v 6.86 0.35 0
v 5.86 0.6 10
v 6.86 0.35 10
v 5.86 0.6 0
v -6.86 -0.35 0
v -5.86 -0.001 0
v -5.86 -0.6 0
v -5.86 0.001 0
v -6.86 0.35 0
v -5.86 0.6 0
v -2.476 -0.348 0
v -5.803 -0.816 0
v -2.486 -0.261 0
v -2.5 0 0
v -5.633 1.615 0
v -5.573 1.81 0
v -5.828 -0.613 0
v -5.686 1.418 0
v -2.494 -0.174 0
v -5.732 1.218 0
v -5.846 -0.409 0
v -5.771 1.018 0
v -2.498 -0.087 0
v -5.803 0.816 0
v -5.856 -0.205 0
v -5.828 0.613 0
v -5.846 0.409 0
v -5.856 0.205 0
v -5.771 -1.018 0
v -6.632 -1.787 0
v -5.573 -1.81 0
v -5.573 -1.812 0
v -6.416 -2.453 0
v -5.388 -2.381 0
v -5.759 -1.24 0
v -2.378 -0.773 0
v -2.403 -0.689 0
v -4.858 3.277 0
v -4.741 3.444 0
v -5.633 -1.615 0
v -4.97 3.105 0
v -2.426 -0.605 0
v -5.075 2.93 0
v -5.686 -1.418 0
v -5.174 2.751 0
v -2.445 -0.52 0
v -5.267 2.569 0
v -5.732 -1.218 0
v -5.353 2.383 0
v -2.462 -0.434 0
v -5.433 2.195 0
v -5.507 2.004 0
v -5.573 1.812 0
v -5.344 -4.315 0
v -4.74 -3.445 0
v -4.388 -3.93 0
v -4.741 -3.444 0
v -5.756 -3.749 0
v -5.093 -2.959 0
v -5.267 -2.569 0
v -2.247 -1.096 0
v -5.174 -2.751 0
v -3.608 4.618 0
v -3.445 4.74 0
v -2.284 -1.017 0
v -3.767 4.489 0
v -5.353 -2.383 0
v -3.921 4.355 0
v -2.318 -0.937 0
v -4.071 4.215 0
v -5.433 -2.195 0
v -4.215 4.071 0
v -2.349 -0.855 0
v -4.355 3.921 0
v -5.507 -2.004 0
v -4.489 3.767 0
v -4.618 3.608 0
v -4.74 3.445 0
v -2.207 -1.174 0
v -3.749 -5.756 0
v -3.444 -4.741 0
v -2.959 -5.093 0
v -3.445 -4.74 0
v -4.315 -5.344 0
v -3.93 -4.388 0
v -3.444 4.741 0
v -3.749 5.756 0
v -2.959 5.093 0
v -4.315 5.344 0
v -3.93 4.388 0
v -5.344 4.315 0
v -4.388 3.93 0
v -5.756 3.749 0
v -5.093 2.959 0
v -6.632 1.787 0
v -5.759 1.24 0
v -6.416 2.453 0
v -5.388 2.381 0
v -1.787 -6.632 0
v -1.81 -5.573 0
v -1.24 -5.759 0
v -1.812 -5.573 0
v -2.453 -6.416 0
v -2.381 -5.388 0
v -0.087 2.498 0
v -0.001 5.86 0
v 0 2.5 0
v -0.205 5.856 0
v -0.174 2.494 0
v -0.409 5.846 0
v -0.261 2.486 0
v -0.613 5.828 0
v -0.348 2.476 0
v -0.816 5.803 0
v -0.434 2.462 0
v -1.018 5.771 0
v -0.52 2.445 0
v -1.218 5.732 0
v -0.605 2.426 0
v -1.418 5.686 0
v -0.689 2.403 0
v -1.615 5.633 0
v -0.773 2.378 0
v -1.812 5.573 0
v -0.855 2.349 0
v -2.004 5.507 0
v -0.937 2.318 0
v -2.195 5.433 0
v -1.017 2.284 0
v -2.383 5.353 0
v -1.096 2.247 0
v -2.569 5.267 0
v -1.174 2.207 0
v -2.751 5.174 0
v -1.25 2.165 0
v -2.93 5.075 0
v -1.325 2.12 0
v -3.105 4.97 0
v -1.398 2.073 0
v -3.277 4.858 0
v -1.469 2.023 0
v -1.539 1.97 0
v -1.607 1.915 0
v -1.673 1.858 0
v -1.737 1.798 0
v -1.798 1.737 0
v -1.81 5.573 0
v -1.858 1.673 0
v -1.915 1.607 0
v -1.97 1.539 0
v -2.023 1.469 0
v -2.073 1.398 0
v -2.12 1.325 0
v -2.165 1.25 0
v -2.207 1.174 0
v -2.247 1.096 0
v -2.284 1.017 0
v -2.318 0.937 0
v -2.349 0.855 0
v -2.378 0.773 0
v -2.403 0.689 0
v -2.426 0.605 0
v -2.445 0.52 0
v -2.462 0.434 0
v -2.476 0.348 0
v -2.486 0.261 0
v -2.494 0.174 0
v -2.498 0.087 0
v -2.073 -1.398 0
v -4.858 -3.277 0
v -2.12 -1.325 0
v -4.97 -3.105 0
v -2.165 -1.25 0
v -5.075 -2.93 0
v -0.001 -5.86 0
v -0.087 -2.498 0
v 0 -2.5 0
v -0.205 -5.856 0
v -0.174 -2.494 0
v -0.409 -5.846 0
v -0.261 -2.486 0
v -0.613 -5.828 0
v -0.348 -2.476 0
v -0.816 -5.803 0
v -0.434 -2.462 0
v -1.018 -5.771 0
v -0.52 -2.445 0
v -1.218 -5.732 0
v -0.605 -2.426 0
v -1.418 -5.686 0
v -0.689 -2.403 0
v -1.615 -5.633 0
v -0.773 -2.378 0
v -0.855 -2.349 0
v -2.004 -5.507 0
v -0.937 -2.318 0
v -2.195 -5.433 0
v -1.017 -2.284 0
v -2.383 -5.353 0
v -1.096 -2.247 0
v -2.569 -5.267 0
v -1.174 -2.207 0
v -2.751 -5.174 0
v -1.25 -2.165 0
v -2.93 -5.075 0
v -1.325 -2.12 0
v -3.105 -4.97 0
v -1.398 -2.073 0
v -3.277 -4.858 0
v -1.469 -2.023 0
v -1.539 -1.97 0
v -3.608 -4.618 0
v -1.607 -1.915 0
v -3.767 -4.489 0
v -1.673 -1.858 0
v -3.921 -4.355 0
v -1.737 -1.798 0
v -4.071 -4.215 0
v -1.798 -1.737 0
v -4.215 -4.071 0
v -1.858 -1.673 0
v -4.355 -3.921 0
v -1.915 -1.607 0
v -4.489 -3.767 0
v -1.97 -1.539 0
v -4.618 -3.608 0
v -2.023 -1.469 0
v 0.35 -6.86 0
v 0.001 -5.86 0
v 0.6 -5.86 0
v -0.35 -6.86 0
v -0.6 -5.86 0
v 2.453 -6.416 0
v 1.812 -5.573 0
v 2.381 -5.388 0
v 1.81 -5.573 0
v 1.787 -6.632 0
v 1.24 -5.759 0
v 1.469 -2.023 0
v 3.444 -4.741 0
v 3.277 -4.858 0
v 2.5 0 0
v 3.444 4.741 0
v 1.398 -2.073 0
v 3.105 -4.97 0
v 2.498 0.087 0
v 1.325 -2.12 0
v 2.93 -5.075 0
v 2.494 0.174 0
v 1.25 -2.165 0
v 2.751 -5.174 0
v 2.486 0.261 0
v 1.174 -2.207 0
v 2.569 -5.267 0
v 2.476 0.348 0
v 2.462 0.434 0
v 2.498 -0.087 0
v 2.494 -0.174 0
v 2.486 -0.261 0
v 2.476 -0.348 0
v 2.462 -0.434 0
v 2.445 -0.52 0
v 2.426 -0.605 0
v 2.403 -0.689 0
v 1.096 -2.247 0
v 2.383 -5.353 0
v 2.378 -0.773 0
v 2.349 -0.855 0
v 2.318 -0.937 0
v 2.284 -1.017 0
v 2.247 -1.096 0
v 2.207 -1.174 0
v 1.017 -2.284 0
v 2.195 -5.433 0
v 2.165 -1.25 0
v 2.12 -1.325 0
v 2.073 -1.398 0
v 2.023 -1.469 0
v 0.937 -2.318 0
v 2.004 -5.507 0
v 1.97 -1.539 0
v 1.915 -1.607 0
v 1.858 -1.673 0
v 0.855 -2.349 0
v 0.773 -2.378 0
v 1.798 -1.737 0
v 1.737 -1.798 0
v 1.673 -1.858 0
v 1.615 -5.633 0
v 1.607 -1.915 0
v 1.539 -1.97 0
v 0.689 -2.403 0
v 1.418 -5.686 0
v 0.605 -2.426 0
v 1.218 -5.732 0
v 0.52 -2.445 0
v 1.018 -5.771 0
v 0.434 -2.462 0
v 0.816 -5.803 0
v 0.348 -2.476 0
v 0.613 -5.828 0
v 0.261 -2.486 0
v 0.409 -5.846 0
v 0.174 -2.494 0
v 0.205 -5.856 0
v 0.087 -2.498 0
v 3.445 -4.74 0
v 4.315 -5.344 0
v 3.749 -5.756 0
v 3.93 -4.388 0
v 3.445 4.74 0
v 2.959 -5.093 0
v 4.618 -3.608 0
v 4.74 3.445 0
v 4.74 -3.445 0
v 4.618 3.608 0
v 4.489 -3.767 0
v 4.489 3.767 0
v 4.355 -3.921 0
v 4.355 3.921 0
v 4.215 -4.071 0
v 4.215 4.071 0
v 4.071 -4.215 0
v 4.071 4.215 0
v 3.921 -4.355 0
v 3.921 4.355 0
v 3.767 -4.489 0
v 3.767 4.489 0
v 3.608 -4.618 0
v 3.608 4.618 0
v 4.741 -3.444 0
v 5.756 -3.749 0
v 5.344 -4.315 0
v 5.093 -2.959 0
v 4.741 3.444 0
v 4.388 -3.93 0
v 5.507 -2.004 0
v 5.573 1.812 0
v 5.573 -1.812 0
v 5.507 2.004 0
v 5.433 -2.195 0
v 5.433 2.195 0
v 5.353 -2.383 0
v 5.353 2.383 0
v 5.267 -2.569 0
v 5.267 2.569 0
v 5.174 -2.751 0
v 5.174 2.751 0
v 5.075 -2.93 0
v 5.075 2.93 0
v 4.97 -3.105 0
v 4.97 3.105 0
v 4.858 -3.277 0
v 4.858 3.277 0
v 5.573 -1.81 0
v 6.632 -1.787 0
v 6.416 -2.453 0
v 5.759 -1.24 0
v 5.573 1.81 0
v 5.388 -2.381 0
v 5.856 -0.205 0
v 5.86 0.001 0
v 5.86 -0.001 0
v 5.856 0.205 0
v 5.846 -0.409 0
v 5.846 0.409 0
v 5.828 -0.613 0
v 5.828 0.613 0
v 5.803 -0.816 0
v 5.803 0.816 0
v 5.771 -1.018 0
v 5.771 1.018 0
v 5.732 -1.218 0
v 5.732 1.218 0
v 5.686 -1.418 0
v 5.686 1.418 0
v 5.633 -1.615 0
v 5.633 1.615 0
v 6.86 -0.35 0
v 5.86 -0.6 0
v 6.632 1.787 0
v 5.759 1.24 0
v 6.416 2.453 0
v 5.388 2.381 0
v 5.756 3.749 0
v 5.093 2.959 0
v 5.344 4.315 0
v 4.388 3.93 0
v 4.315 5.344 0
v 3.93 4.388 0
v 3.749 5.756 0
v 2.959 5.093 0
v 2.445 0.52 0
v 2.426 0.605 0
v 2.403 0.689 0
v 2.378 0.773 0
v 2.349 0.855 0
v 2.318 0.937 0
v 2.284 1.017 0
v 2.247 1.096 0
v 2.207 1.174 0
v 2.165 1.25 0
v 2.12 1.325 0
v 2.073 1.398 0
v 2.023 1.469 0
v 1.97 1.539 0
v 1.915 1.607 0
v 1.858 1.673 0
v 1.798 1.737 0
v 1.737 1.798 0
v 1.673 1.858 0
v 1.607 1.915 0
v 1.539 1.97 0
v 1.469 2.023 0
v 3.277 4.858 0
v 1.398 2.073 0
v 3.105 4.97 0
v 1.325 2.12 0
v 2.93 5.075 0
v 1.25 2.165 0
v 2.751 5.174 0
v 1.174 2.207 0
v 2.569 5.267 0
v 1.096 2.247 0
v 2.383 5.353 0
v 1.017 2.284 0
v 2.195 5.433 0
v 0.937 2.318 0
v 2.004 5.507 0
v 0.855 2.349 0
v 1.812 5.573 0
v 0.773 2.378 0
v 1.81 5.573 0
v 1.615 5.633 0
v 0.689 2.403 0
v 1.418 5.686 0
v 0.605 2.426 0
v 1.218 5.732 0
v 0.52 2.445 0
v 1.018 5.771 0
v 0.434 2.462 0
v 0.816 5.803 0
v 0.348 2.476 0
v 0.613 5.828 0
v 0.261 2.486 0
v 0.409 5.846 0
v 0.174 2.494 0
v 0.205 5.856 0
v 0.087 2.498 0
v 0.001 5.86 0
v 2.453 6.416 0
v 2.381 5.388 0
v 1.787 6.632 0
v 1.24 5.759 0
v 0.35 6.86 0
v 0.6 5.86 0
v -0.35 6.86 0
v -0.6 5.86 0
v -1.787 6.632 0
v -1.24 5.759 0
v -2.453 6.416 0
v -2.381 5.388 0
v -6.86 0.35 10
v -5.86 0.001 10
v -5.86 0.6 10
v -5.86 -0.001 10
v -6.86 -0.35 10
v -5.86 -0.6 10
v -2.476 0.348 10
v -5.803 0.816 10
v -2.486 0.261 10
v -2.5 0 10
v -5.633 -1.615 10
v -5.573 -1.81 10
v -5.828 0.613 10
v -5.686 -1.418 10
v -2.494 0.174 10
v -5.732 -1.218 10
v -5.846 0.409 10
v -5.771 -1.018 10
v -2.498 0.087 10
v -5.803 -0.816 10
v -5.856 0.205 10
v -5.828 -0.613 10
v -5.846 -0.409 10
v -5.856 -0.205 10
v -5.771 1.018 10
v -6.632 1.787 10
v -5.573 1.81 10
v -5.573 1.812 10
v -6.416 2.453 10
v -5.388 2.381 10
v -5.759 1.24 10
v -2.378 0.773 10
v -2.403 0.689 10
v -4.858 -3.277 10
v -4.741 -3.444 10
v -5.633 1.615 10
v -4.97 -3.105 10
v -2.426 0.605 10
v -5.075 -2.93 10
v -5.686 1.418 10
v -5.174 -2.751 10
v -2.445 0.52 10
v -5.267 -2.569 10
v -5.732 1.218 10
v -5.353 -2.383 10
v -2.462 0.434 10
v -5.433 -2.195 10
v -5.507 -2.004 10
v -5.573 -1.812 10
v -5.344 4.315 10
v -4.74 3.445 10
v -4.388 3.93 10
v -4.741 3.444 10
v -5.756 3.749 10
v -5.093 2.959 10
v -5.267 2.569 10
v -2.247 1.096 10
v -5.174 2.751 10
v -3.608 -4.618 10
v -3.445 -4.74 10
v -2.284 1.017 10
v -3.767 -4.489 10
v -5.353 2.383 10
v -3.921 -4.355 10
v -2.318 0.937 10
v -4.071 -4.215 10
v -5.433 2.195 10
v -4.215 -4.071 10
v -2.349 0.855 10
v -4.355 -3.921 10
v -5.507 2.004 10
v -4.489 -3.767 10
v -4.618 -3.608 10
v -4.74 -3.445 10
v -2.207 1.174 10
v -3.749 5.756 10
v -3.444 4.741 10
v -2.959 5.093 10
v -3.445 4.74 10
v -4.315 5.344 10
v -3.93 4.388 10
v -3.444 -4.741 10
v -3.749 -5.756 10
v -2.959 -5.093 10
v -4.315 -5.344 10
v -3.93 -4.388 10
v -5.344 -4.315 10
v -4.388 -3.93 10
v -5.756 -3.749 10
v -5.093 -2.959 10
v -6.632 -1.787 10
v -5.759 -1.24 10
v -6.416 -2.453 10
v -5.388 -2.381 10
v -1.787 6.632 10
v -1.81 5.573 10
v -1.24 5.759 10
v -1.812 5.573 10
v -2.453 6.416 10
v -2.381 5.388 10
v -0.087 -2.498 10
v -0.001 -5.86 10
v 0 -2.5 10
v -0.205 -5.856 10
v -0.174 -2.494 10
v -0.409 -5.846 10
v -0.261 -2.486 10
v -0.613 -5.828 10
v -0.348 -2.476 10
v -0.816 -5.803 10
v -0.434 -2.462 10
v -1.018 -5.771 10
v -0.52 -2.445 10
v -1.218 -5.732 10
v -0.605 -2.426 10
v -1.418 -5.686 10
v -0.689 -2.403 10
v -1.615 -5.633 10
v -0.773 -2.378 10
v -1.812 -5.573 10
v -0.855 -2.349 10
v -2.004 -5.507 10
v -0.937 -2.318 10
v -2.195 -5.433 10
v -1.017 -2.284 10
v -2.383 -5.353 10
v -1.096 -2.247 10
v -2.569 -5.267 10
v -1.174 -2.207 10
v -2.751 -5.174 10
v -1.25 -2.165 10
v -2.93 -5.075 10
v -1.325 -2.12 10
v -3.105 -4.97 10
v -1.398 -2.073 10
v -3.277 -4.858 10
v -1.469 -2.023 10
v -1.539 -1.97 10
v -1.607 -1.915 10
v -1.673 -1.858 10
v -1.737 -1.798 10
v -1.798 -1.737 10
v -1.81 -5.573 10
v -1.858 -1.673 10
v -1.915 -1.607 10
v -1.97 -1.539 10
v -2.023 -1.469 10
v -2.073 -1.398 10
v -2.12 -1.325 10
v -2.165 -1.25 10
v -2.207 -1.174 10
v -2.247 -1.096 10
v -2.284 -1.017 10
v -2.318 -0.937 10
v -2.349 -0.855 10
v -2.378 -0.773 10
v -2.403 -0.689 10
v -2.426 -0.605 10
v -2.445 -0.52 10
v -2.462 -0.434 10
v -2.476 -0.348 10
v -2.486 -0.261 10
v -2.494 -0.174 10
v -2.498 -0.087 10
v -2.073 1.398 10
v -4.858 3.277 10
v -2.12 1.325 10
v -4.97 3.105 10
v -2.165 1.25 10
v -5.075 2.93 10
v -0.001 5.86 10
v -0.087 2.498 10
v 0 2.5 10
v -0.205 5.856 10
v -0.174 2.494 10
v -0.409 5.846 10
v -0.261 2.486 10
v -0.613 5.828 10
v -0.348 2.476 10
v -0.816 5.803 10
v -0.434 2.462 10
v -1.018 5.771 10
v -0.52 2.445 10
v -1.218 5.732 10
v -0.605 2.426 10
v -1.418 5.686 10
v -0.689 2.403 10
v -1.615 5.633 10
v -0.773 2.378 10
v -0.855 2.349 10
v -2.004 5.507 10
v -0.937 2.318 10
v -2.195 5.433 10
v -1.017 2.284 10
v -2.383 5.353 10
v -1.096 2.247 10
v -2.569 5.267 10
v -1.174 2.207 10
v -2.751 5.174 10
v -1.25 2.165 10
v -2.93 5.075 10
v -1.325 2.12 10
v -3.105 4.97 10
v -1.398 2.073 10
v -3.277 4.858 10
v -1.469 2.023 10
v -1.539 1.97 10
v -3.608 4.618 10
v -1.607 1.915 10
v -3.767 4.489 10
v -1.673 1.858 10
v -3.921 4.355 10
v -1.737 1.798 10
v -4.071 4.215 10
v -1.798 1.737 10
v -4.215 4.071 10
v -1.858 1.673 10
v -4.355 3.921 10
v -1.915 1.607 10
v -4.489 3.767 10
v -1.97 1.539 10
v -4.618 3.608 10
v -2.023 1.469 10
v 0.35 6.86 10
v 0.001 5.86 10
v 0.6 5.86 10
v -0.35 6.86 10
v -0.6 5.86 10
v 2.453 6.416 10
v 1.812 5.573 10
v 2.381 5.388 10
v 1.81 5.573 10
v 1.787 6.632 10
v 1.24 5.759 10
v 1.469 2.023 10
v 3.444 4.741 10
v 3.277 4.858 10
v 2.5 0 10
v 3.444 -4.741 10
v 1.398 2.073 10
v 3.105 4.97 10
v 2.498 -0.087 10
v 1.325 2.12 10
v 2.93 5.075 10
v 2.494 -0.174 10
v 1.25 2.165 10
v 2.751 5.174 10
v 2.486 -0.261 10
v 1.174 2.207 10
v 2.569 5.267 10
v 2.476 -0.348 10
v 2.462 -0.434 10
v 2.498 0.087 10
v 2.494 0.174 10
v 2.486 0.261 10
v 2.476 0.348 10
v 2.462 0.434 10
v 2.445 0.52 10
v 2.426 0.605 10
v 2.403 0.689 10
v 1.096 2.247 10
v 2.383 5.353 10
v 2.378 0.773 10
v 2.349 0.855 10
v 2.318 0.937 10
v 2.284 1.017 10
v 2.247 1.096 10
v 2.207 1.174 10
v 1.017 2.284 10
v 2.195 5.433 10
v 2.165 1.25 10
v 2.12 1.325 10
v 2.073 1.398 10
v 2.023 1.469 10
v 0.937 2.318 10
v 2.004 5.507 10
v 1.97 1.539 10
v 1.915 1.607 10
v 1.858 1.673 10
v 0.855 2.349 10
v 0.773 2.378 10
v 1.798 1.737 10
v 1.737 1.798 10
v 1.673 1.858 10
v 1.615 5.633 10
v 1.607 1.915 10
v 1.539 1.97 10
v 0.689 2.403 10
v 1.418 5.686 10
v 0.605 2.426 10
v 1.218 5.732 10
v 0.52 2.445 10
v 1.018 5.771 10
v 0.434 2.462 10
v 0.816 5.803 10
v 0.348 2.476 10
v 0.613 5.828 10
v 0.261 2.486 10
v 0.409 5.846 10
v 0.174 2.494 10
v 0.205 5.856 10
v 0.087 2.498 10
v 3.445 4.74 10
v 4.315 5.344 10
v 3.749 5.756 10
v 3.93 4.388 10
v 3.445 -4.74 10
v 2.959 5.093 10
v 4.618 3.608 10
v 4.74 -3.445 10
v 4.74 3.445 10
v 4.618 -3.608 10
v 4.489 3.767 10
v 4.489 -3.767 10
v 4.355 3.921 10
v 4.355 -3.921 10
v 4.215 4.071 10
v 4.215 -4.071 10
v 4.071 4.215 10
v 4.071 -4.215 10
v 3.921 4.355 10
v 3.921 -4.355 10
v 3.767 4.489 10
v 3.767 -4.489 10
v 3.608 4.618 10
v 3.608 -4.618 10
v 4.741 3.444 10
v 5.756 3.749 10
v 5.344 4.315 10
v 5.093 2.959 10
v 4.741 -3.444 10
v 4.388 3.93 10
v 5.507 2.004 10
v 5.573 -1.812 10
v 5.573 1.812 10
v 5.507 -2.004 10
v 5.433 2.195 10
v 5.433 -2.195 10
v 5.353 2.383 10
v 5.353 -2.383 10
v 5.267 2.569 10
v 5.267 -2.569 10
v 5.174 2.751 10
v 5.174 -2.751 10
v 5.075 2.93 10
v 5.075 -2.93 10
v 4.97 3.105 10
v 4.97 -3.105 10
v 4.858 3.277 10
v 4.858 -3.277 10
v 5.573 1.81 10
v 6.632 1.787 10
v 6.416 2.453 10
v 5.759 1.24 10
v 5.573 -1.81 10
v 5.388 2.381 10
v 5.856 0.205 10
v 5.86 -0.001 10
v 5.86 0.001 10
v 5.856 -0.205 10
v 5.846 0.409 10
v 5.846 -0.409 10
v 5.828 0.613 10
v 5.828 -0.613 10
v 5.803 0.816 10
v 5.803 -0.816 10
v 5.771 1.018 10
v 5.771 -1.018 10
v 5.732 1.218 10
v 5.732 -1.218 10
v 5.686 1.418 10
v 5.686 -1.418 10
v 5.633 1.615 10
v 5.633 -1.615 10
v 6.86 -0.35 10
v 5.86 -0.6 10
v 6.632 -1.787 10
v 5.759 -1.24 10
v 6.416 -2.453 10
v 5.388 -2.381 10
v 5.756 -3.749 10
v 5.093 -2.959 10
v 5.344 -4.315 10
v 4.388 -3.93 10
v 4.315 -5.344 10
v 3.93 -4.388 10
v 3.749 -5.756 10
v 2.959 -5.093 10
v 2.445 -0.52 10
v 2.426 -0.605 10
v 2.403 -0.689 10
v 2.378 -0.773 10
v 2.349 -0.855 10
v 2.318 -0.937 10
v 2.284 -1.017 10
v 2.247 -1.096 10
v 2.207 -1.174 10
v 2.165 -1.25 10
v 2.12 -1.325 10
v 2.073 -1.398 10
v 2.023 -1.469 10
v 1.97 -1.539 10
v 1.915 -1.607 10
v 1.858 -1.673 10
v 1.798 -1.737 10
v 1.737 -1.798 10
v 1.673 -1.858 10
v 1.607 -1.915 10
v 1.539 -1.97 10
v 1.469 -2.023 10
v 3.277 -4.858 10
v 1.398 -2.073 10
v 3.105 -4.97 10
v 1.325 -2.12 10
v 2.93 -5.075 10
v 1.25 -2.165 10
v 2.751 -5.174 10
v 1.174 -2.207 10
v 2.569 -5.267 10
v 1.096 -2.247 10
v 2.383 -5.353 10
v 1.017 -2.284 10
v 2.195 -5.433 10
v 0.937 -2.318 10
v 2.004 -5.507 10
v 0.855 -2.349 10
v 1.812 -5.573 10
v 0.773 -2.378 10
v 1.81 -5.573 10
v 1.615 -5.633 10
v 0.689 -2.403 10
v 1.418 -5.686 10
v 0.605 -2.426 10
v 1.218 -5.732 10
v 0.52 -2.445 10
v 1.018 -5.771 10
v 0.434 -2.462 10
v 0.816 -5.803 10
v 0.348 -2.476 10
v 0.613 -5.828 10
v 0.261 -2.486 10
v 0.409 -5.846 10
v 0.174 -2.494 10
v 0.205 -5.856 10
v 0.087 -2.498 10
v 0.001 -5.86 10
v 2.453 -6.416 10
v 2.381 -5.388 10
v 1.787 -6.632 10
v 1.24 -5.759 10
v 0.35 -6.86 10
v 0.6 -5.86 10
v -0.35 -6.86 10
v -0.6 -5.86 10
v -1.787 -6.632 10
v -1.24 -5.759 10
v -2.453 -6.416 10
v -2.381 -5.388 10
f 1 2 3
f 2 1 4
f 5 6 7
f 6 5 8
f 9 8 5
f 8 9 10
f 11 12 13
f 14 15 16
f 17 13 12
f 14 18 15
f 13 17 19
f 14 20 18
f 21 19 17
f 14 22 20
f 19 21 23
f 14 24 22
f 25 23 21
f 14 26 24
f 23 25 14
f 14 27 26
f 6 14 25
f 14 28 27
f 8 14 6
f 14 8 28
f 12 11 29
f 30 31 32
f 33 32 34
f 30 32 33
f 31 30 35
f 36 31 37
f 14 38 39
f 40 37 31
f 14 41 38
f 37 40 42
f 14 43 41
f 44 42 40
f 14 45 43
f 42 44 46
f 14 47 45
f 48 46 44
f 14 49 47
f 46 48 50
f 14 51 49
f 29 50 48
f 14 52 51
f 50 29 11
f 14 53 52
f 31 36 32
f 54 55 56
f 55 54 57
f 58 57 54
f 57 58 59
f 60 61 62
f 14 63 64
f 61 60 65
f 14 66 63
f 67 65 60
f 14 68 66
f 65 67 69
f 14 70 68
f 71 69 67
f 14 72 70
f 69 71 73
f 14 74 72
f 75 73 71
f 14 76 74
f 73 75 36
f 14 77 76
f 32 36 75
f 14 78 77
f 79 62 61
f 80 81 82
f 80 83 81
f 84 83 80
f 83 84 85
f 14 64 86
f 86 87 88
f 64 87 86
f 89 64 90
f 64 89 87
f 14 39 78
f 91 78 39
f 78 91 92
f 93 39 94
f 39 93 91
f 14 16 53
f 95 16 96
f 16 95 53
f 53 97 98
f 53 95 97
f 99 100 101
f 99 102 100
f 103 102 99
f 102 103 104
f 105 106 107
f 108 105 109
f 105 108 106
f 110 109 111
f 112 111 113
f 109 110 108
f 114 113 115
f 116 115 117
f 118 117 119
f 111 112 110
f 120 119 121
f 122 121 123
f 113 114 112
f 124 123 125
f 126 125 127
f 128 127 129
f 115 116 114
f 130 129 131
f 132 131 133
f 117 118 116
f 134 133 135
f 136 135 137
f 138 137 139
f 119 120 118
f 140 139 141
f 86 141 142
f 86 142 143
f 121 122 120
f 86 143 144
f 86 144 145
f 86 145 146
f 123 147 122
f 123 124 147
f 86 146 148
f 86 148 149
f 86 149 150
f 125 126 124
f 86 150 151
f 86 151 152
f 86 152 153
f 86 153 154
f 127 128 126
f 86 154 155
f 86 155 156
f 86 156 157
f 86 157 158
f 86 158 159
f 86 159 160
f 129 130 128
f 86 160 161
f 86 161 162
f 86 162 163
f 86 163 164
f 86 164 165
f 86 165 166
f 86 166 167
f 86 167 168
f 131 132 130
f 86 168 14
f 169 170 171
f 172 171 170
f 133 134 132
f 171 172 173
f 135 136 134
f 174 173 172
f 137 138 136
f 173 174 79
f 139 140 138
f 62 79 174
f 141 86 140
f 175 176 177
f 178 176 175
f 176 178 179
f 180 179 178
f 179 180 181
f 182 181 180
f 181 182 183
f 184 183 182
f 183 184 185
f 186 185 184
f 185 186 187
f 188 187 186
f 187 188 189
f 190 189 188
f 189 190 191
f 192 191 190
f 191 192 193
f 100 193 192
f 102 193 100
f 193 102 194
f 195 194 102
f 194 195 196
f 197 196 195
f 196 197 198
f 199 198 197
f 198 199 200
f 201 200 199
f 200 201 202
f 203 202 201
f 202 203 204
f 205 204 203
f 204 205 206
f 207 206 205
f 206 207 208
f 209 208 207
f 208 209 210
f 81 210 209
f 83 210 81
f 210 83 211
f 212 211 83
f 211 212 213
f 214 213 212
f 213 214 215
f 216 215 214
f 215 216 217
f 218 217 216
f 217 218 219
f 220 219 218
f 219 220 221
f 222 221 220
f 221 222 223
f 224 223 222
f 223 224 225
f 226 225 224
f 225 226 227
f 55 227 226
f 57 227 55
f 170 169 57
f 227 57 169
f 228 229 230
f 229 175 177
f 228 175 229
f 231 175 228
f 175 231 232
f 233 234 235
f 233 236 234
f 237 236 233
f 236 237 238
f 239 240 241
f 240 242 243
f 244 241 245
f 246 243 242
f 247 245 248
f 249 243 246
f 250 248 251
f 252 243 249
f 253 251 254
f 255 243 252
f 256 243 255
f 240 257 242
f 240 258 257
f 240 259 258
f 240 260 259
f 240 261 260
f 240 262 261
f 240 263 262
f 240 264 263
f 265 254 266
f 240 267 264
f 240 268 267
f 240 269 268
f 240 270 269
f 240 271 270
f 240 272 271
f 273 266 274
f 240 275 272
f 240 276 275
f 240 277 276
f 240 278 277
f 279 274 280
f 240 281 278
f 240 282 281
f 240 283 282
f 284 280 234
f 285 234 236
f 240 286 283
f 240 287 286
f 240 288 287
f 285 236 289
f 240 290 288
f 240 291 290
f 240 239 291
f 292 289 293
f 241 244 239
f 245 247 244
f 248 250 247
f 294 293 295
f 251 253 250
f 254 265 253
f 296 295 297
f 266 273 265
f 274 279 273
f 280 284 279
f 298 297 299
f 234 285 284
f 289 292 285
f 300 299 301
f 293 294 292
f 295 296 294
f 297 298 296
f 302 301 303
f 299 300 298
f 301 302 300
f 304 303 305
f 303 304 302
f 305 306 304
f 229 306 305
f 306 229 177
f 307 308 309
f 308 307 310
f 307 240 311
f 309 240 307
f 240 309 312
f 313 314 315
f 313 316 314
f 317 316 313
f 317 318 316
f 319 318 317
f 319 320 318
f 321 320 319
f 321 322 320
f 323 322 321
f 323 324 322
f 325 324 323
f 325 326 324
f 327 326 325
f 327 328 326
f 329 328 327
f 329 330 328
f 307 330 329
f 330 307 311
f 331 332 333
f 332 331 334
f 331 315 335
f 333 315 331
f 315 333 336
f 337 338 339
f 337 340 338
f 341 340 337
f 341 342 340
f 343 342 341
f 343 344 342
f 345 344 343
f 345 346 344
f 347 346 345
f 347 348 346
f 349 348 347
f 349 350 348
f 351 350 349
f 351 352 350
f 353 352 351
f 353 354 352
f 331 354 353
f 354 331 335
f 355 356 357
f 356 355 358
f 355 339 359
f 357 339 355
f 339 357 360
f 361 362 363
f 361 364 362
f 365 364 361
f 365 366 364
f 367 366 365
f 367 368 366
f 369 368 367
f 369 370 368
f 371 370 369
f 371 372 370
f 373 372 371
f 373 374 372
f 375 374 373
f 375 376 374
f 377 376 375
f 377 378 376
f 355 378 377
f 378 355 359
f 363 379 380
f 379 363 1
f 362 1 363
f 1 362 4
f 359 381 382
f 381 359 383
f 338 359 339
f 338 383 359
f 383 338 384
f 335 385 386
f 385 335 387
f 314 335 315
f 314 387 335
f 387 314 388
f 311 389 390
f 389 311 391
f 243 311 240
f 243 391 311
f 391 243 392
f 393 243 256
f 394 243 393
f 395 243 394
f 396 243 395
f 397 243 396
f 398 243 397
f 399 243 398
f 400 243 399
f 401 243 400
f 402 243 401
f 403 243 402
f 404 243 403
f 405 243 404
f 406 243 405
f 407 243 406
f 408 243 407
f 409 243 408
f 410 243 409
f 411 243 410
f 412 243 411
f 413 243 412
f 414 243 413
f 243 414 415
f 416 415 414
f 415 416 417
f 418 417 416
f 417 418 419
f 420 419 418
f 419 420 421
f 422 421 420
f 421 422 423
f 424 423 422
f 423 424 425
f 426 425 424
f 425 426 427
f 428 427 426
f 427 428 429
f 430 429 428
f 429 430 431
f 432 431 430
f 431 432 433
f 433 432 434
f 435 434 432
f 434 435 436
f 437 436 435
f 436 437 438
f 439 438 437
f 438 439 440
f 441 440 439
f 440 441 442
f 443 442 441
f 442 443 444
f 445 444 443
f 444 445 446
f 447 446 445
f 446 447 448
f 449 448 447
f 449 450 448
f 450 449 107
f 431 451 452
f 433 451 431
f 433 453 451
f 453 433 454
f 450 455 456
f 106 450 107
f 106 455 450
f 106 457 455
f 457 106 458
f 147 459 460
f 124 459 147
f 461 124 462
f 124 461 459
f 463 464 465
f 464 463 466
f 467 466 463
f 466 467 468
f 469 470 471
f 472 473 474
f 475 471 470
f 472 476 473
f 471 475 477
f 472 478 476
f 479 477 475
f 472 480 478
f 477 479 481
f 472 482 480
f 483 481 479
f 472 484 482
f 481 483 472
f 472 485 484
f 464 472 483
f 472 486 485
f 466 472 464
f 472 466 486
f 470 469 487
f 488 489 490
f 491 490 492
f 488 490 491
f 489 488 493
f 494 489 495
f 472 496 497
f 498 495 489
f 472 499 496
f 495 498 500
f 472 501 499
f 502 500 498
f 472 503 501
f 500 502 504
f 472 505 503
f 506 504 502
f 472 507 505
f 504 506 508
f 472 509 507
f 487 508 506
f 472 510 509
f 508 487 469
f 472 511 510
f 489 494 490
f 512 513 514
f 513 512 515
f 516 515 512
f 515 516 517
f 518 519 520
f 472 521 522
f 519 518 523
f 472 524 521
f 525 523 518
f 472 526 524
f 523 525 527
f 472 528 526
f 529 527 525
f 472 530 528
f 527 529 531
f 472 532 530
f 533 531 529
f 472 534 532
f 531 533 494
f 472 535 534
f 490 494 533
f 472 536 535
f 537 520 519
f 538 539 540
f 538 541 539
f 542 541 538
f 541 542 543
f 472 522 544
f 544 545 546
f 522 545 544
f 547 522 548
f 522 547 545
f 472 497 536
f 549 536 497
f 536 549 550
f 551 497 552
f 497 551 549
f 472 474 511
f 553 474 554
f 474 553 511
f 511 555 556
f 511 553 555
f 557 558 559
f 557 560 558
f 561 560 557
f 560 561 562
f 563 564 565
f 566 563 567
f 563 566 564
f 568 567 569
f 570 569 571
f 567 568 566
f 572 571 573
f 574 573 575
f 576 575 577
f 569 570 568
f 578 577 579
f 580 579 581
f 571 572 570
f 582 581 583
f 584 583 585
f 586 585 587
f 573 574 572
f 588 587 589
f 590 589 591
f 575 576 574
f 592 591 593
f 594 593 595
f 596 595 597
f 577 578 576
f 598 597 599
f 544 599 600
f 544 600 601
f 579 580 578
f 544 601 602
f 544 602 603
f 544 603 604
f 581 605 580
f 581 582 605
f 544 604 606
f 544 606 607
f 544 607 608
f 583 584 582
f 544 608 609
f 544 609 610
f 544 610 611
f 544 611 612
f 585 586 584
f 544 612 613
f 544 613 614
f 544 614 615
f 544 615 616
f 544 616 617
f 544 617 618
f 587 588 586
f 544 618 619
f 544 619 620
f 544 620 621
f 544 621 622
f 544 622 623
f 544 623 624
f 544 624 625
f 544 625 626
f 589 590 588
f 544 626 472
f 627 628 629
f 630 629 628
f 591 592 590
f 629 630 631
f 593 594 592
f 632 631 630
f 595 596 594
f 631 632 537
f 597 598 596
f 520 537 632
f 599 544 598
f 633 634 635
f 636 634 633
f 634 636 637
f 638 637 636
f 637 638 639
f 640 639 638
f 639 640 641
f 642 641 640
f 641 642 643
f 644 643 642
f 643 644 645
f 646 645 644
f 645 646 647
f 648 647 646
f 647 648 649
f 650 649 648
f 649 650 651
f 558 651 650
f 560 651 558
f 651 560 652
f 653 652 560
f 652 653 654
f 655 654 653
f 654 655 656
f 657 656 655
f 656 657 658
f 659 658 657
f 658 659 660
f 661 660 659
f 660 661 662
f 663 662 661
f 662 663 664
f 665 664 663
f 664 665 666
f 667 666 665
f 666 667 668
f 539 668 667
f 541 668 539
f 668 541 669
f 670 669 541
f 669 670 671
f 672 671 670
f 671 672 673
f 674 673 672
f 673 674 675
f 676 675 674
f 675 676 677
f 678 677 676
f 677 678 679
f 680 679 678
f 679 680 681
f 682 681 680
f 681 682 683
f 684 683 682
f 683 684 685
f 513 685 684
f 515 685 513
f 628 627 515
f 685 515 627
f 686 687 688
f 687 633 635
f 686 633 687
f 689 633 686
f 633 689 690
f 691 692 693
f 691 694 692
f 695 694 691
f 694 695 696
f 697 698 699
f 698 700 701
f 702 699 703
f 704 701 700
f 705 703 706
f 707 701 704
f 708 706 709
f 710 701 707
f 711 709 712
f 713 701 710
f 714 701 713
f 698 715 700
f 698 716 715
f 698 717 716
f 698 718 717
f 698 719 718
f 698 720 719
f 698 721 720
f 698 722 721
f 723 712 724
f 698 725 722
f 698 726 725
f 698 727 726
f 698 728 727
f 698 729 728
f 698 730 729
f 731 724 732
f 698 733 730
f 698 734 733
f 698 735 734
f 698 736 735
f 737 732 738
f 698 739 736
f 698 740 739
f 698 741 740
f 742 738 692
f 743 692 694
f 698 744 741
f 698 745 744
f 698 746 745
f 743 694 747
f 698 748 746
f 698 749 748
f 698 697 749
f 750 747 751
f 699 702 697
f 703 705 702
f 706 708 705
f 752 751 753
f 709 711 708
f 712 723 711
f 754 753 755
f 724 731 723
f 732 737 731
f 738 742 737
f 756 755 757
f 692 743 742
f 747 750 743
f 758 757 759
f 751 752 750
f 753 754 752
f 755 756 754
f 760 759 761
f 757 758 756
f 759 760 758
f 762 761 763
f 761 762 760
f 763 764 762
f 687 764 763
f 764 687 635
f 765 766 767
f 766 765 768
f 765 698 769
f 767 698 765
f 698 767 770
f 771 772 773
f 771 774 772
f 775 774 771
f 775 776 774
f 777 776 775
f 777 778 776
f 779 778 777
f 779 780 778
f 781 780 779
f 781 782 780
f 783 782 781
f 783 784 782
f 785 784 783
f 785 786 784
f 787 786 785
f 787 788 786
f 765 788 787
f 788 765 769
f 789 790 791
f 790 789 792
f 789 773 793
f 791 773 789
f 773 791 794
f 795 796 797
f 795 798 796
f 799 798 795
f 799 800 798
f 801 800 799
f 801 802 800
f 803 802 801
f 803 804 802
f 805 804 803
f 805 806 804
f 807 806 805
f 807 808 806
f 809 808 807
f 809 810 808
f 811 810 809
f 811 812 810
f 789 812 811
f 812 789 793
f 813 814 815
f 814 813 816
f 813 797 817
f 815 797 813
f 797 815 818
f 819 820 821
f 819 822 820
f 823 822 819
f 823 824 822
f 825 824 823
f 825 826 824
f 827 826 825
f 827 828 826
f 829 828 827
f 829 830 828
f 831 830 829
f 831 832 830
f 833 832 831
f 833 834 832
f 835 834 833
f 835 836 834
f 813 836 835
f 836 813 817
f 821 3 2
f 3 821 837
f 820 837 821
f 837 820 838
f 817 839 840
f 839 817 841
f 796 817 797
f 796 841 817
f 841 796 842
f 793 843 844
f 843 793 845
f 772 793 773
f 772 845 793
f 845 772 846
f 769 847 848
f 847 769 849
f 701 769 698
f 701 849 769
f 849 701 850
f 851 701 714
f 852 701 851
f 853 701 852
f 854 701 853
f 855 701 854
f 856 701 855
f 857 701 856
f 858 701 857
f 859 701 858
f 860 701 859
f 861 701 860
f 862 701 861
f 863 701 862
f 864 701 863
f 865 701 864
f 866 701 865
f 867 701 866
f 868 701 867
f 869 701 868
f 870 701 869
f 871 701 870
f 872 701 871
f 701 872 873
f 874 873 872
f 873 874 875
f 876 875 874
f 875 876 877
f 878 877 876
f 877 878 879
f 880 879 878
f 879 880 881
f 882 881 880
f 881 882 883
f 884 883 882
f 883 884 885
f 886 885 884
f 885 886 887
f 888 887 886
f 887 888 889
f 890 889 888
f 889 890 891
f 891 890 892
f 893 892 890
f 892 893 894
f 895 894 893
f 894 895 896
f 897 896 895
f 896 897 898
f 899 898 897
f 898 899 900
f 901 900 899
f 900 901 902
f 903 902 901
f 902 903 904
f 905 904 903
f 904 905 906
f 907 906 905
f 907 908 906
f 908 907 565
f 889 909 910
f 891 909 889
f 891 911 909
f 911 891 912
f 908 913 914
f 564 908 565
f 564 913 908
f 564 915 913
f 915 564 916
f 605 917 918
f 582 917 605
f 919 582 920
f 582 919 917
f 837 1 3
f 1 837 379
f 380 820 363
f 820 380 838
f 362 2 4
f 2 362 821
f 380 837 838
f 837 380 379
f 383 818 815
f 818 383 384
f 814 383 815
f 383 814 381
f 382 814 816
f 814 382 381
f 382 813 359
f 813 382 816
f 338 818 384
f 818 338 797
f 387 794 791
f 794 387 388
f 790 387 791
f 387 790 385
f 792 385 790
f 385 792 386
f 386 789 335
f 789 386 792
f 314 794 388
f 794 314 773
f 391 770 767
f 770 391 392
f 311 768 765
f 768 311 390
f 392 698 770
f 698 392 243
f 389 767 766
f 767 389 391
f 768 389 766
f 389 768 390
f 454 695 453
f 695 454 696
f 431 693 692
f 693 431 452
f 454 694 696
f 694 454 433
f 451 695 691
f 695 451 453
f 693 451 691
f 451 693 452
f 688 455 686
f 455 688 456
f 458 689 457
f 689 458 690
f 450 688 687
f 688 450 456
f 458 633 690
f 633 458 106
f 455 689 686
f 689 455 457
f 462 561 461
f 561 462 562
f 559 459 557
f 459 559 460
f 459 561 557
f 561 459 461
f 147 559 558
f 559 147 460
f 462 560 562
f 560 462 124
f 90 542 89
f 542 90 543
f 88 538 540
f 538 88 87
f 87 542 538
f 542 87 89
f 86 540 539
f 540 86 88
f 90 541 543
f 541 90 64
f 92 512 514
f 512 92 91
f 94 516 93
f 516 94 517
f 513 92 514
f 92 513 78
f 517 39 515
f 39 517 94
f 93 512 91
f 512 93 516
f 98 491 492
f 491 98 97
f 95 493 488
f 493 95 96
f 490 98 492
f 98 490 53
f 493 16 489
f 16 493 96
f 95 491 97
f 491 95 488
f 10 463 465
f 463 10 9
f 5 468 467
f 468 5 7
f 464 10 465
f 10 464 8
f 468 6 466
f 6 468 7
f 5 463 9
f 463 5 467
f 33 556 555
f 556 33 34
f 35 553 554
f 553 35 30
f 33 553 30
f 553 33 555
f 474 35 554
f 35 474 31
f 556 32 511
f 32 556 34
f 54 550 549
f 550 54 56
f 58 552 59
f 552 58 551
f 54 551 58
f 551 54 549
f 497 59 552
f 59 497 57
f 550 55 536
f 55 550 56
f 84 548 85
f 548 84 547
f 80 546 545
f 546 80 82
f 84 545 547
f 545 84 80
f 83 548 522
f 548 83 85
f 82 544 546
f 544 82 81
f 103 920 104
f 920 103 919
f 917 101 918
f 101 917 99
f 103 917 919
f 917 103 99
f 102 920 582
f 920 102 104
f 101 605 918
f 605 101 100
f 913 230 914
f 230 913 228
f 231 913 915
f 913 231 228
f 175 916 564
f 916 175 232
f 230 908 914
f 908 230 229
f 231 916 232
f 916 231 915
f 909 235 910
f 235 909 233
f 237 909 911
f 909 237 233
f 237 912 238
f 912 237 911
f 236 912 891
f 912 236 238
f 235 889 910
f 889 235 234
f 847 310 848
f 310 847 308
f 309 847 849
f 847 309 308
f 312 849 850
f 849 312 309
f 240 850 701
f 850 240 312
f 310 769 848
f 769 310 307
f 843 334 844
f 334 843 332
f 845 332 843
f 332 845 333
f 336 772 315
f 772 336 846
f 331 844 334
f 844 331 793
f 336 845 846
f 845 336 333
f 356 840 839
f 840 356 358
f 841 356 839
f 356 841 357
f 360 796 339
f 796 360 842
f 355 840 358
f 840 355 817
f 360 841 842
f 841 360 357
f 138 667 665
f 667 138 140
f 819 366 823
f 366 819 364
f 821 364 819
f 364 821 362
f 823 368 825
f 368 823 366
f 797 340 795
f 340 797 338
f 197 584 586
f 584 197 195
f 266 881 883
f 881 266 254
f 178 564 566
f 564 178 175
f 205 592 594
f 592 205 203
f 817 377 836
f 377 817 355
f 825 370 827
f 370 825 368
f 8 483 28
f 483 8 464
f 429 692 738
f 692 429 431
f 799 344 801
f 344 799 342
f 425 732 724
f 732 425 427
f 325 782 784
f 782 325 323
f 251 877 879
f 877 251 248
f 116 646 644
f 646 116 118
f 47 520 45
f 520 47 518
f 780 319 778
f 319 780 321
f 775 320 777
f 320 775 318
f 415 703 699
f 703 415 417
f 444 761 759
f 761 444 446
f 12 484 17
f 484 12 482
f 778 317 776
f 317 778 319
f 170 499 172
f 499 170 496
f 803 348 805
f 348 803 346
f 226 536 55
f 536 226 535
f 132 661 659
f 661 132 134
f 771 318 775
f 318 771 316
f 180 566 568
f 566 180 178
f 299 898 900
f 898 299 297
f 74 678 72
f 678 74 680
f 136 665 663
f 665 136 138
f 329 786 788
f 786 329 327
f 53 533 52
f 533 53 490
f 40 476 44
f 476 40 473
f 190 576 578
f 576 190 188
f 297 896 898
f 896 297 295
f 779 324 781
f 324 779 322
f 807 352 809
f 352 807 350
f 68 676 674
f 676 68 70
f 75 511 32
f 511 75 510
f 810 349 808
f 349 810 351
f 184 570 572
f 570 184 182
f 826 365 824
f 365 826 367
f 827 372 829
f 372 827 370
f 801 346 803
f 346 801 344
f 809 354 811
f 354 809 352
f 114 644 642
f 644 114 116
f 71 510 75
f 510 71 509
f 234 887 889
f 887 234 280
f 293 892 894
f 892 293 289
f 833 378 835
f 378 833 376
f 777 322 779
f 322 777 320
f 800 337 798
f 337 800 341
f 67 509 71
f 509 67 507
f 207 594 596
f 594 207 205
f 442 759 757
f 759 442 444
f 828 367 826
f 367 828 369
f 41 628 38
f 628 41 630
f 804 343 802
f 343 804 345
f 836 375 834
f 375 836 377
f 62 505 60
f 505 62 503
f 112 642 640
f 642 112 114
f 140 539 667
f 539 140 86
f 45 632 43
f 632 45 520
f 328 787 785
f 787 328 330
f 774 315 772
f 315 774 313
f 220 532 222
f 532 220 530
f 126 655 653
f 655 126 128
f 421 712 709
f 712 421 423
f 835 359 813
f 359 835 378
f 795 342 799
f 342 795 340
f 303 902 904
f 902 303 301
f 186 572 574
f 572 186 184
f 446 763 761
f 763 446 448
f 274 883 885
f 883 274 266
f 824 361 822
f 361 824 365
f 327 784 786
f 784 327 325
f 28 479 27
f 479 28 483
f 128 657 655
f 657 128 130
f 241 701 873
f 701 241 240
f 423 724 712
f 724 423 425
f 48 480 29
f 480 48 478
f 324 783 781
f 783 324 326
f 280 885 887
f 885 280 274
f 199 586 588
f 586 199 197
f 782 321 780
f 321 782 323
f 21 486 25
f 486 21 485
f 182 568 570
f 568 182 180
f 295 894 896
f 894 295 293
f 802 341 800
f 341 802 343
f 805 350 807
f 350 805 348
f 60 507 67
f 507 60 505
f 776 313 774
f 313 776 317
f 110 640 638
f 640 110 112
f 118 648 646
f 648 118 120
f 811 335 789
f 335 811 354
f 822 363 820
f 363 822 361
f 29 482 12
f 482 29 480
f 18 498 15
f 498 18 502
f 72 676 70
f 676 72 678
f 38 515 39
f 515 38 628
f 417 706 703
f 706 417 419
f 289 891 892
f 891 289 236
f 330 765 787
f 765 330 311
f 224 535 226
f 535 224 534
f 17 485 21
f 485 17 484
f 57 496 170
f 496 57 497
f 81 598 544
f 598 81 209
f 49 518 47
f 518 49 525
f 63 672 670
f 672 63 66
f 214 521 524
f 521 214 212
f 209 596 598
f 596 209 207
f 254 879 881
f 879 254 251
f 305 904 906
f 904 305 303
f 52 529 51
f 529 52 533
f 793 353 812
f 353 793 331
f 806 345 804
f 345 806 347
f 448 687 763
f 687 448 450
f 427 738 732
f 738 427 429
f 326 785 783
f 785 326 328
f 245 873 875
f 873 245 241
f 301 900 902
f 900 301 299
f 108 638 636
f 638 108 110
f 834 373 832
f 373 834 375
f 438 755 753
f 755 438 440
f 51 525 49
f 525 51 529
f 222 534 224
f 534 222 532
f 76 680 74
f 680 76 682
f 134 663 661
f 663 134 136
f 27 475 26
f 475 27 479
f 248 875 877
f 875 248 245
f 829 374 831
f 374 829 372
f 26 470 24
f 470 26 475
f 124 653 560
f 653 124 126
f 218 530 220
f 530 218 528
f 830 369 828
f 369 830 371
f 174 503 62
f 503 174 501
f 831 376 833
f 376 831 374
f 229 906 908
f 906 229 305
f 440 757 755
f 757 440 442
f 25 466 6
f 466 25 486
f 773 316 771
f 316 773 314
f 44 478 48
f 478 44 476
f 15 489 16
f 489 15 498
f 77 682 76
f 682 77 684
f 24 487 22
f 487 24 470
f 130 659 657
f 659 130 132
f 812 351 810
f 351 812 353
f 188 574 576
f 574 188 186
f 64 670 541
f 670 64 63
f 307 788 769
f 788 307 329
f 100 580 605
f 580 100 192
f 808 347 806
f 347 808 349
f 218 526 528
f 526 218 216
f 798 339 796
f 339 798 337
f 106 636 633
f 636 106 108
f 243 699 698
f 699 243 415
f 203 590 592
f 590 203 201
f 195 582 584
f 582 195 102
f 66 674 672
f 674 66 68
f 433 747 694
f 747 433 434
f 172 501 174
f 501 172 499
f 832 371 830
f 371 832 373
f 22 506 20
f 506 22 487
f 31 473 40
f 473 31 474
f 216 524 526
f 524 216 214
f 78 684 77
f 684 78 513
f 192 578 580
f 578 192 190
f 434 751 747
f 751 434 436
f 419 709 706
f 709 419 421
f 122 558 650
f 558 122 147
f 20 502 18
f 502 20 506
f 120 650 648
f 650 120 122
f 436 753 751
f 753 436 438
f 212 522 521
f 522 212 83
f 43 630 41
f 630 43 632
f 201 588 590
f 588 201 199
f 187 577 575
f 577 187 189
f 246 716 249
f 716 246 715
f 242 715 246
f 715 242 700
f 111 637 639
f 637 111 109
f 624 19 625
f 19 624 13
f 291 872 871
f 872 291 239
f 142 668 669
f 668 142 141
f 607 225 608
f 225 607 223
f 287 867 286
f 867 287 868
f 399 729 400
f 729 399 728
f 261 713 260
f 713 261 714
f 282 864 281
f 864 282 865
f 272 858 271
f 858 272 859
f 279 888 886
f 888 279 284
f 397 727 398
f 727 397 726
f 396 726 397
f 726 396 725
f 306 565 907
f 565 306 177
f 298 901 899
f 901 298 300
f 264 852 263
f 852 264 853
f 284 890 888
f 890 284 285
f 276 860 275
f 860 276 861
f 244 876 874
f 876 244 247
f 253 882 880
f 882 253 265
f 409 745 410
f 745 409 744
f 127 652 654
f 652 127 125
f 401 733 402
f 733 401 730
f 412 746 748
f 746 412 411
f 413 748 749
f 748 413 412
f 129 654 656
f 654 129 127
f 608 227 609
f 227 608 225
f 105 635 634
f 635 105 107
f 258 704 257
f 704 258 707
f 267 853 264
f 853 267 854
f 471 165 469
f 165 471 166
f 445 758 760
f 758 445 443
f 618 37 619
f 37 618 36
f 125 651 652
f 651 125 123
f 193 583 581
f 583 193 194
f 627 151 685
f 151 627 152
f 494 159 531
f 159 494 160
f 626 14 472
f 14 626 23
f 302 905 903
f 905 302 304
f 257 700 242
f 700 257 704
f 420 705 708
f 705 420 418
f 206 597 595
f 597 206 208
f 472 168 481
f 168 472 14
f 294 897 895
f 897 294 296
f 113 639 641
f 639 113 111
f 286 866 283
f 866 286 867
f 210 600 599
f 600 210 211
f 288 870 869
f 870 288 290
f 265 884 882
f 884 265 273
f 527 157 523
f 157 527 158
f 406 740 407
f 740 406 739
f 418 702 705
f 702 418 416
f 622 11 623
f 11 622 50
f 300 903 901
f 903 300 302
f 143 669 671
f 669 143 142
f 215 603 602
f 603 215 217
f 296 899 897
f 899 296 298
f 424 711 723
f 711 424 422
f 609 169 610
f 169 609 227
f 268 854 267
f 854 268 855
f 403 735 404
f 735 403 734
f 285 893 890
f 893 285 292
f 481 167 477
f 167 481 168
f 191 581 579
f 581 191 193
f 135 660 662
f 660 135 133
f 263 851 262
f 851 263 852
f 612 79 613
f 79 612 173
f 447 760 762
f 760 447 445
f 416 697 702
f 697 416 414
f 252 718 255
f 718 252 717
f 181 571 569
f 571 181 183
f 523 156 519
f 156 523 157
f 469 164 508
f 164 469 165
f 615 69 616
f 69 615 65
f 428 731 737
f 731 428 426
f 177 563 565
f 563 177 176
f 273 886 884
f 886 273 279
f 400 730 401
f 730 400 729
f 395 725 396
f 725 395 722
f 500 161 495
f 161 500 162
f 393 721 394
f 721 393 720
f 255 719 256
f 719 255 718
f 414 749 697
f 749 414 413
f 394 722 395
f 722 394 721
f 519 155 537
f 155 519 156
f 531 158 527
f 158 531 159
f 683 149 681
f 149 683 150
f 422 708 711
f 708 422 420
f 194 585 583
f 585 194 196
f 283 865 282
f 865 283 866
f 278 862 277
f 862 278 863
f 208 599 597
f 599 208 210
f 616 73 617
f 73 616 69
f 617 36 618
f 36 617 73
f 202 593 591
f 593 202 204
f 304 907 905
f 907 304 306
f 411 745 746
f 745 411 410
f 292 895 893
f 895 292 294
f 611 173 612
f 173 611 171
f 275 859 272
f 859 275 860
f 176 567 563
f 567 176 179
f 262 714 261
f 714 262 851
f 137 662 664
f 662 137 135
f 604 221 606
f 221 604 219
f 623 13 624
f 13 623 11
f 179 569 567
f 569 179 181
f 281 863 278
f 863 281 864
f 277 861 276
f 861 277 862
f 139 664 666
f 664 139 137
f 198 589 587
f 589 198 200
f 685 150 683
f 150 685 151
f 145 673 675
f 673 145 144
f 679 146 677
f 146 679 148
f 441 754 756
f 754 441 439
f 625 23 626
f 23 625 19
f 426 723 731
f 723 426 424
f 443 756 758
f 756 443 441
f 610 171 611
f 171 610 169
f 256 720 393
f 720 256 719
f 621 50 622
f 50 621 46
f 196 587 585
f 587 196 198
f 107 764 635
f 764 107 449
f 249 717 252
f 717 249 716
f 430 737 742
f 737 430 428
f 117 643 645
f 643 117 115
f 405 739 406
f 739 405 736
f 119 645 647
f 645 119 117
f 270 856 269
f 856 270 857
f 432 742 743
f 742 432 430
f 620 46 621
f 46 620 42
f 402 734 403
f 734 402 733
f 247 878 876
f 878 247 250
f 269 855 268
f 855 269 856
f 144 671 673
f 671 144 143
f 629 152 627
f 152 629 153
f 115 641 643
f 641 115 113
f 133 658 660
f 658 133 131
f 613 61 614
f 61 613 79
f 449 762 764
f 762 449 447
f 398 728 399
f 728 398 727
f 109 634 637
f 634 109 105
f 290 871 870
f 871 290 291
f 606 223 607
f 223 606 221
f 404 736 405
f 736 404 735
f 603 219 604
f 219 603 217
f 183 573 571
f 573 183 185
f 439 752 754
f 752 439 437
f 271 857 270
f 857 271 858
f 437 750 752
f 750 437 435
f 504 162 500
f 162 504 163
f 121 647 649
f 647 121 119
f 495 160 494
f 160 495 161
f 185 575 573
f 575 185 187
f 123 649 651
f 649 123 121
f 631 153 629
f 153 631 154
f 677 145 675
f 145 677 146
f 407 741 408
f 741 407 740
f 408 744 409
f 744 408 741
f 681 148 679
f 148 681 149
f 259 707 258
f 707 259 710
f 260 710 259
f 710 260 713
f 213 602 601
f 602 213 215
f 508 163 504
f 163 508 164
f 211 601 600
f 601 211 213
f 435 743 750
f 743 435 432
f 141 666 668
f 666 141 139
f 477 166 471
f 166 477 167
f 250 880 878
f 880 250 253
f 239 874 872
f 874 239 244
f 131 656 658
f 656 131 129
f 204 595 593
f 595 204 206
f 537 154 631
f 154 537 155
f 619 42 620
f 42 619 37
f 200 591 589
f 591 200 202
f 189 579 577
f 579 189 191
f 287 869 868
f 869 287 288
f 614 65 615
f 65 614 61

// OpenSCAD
$fn = 180;

// Timing pulley (simplified GT2-like tooth form)
// User specs:
teeth = 20;
pitch_diameter = 12.22;   // mm

// Assumptions / defaults (can be edited):
pulley_width = 10;        // mm
bore_diameter = 5;        // mm
hub_diameter = 0;         // 0 = no hub
hub_height = 0;           // mm

// Tooth geometry (approximate, not manufacturer-exact):
tooth_height = 0.75;      // radial height above pitch circle (mm)
tooth_tip_width = 0.70;   // tangential width at tooth tip (mm)
tooth_root_width = 1.20;  // tangential width at tooth root (mm)
root_clearance = 0.25;    // radial clearance below pitch circle (mm)

// Derived:
pitch_radius = pitch_diameter / 2;
pitch_circumference = PI * pitch_diameter;
pitch = pitch_circumference / teeth;
tooth_angle = 360 / teeth;

// Base cylinder radii:
r_root = max(0.1, pitch_radius - root_clearance);
r_tip  = pitch_radius + tooth_height;

module tooth2d() {
    // Trapezoid centered on +X axis, extruded later
    polygon(points=[
        [r_root, -tooth_root_width/2],
        [r_root,  tooth_root_width/2],
        [r_tip,   tooth_tip_width/2],
        [r_tip,  -tooth_tip_width/2]
    ]);
}

module pulley_body() {
    union() {
        // Root cylinder
        cylinder(h=pulley_width, r=r_root);

        // Teeth
        for (i = [0:teeth-1]) {
            rotate([0,0,i*tooth_angle])
                linear_extrude(height=pulley_width)
                    tooth2d();
        }

        // Optional hub
        if (hub_diameter > 0 && hub_height > 0) {
            translate([0,0,(pulley_width - hub_height)/2])
                cylinder(h=hub_height, d=hub_diameter);
        }
    }
}

difference() {
    pulley_body();
    // Bore
    translate([0,0,-1])
        cylinder(h=pulley_width+2, d=bore_diameter);
}
